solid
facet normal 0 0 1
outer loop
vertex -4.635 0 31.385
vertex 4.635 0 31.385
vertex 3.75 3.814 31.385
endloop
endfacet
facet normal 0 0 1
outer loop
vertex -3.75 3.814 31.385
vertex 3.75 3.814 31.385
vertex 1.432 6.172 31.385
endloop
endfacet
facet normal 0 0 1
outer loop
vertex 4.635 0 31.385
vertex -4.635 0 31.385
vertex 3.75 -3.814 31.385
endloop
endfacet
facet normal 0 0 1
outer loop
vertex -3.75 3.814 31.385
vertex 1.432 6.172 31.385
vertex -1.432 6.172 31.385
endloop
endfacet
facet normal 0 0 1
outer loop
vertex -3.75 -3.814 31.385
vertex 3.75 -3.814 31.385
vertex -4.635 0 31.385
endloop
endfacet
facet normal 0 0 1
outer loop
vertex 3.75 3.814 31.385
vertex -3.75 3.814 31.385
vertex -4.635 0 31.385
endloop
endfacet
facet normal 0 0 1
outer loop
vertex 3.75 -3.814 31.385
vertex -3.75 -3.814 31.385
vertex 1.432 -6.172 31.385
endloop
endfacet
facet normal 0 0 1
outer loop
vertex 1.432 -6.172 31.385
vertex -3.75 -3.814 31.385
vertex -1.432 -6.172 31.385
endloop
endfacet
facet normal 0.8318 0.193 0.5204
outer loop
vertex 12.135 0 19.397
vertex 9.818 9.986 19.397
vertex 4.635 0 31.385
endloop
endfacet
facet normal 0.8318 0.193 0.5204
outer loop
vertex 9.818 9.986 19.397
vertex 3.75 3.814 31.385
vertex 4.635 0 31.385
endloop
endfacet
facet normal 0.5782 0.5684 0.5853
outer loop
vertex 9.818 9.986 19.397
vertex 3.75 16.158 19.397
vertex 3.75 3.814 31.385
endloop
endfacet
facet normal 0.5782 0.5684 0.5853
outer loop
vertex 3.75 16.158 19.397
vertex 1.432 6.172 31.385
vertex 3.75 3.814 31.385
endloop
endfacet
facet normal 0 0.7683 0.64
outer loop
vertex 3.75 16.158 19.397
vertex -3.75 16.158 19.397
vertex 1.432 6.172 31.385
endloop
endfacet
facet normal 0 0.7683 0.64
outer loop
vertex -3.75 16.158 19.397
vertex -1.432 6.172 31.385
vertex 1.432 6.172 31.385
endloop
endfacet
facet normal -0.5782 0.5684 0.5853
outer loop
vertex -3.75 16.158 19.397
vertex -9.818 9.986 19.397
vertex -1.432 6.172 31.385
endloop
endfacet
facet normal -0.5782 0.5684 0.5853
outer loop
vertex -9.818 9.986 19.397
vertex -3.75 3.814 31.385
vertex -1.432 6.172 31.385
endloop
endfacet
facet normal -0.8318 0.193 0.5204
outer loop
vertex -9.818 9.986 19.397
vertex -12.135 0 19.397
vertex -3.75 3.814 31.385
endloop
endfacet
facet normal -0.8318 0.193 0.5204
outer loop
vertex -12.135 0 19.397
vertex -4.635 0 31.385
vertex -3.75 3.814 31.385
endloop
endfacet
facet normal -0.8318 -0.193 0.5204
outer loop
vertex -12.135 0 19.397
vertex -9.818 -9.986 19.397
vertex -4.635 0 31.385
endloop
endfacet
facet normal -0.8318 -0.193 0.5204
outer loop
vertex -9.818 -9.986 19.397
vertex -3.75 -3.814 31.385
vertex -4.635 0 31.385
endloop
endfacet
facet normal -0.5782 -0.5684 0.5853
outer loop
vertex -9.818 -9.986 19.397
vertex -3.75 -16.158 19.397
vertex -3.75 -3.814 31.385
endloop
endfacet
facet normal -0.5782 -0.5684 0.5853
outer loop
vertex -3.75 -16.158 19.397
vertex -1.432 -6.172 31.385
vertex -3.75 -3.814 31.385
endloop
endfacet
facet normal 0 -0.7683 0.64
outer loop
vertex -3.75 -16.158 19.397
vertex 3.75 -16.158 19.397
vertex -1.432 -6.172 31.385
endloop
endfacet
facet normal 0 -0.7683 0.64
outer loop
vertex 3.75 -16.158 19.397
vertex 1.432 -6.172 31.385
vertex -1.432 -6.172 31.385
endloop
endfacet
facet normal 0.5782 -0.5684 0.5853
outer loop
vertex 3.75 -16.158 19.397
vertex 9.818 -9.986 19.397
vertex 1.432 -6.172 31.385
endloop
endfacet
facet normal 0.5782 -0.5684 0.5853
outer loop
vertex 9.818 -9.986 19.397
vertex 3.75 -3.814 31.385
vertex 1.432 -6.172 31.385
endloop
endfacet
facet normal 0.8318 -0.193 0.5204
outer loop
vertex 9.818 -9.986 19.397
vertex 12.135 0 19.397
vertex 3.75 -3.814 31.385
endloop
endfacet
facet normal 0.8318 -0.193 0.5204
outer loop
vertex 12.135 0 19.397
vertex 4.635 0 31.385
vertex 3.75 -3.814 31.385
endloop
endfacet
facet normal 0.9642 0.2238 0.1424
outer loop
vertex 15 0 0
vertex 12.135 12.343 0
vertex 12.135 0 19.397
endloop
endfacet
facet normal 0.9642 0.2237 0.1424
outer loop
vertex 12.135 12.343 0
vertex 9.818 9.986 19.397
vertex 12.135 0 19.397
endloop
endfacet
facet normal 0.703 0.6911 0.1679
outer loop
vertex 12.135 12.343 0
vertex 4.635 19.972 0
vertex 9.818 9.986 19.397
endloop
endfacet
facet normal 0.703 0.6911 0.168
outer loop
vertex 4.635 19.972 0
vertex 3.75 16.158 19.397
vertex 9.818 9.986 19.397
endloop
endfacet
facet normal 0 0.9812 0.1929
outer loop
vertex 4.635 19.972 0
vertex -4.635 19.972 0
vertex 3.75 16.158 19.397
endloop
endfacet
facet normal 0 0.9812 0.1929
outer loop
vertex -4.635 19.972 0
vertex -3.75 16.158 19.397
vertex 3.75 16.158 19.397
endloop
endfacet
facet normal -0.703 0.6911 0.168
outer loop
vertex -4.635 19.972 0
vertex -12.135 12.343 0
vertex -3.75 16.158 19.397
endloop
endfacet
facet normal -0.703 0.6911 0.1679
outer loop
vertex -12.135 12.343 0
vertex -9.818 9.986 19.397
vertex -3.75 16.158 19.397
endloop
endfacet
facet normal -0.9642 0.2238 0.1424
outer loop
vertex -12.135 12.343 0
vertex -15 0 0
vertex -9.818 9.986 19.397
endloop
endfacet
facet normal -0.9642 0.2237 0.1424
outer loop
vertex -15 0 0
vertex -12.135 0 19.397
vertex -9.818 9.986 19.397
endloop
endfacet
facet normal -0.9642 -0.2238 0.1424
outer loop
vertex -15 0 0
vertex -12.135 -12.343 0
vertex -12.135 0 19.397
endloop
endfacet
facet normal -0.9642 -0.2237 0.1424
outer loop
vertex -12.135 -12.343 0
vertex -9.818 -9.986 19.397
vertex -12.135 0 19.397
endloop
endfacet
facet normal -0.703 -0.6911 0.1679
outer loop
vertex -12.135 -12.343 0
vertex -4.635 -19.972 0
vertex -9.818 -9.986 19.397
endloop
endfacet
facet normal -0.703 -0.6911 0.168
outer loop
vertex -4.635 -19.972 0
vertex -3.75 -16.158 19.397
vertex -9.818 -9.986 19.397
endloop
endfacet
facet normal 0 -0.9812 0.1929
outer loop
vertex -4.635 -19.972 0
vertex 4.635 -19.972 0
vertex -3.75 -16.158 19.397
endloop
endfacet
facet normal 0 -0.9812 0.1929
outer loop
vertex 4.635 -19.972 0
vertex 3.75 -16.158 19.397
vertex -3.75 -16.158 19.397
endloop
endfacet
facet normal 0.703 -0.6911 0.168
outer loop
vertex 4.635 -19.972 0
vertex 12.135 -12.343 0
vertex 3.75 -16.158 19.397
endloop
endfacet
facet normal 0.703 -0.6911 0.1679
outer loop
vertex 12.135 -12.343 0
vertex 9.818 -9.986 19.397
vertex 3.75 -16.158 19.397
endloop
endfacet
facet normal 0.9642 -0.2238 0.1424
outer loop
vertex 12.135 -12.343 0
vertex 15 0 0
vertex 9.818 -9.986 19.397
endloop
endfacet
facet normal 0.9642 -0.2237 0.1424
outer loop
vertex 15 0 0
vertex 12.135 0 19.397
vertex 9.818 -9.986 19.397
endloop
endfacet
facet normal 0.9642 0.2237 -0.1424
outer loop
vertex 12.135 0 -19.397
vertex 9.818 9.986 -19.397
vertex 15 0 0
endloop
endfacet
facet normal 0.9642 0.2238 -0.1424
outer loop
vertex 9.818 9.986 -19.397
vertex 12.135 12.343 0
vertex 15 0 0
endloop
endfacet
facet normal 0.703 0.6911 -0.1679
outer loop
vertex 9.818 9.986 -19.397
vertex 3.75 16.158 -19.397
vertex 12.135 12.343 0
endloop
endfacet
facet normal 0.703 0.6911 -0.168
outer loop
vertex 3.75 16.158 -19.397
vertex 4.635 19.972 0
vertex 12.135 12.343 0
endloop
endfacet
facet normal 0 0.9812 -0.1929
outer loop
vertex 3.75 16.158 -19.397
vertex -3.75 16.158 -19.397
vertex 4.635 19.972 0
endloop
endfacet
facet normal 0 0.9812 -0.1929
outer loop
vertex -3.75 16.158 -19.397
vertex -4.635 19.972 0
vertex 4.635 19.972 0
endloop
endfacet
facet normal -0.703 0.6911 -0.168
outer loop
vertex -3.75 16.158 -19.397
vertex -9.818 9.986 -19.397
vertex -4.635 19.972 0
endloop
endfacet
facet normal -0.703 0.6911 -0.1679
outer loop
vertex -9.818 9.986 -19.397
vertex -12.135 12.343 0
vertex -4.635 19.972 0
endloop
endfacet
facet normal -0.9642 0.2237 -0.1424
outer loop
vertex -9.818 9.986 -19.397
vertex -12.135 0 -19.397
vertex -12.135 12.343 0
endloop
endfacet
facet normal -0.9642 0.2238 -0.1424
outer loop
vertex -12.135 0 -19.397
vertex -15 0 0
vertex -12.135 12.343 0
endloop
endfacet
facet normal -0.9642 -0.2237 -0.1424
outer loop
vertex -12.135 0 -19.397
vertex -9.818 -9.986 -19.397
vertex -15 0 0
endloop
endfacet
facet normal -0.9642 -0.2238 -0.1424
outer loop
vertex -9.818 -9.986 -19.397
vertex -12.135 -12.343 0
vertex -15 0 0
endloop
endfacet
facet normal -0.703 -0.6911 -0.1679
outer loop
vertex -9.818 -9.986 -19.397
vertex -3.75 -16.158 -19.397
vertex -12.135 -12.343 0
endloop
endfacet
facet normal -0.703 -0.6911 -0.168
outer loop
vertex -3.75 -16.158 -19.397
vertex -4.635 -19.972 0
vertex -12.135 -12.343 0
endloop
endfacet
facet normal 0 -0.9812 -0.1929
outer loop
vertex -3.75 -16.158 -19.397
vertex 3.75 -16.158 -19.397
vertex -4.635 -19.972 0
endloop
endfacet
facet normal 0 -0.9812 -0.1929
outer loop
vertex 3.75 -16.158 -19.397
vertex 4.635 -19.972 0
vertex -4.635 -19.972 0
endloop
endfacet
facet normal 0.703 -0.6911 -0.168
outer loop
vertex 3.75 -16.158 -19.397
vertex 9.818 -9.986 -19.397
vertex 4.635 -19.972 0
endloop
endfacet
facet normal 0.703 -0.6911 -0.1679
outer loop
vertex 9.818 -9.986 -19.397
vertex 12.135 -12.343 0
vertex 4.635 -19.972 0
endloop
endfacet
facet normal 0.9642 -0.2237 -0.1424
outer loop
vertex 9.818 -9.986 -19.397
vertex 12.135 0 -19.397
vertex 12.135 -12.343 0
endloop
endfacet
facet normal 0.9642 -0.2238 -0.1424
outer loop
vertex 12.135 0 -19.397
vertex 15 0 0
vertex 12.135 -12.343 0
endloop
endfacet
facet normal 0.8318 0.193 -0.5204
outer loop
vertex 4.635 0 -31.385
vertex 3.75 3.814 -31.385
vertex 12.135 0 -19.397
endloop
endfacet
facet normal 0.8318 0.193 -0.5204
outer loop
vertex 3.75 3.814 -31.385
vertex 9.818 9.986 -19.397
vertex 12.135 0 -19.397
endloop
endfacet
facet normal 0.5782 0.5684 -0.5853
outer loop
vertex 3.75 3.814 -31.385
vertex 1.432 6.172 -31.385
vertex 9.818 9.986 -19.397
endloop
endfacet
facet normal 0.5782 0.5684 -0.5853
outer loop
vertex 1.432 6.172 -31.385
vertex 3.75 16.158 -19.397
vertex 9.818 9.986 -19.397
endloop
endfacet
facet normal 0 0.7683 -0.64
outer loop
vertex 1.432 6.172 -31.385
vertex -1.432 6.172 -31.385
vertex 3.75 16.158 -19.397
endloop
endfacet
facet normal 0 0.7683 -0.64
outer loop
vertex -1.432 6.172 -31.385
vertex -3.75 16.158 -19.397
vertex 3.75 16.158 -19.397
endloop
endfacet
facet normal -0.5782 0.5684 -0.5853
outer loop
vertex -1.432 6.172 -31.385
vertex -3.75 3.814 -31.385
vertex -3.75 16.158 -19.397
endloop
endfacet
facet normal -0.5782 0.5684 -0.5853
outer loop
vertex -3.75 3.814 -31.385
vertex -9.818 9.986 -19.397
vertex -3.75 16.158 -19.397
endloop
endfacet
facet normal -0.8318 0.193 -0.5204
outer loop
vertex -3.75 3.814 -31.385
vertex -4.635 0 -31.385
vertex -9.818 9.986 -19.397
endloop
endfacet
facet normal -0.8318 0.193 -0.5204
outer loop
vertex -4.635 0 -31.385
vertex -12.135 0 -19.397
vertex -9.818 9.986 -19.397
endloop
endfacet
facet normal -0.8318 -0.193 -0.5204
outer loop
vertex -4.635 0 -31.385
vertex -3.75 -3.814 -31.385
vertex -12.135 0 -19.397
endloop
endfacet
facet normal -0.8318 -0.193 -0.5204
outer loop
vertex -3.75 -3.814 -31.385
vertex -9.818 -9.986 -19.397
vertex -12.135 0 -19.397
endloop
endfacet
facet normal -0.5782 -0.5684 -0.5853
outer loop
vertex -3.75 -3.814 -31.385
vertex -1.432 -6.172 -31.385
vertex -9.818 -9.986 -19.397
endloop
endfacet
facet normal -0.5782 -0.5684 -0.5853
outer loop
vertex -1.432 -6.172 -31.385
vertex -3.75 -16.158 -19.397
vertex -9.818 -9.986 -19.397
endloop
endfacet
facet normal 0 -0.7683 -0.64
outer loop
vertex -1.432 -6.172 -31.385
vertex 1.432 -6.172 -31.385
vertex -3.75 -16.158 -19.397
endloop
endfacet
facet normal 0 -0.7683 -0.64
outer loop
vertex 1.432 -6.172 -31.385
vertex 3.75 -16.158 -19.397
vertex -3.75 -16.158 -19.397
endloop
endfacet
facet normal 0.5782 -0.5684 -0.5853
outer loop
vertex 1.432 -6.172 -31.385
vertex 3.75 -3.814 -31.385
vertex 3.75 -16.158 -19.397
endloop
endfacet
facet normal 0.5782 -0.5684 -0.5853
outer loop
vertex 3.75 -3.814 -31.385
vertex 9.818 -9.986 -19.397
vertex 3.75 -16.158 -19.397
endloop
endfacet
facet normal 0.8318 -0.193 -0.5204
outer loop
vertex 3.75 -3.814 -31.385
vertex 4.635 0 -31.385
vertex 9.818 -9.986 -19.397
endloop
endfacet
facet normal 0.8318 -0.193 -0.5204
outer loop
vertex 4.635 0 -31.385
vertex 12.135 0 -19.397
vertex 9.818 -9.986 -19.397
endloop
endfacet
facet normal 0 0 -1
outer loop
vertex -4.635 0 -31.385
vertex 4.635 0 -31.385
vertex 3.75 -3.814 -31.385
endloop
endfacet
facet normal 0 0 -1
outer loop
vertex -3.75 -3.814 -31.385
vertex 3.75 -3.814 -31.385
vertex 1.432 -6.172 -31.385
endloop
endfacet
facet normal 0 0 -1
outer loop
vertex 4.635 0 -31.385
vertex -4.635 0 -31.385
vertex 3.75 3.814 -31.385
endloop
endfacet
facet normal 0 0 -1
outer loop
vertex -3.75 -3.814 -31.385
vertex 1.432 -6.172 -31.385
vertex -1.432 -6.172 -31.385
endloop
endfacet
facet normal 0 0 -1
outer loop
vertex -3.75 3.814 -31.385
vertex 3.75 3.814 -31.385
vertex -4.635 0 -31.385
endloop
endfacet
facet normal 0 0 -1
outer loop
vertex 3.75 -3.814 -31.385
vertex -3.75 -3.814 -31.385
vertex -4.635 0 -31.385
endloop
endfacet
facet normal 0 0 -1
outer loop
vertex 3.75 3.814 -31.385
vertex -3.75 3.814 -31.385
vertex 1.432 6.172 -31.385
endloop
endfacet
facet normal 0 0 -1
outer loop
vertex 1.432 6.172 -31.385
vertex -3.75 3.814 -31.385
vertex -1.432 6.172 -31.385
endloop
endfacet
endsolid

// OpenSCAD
// Generated by SolidPython 1.0.1 on 2020-07-29 00:46:46


scale(v = [5, 7, 11]) {
	sphere(r = 3);
}
/***********************************************
*********      SolidPython code:      **********
************************************************
 
# import packages: SolidPython
from solid import *
from solid.utils import *
from itertools import chain, combinations, permutations


class Resize:

    def __init__(self, scad_file):
        self.scad_file = scad_file
        #self.scad_file = import_scad(scad_file)
        # cone/cylinder param:
        self.r1 = 0
        self.r2 = 0
        self.h = 0
        # rectangular prism param:
        self.w = 0
        self.l = 0
        # ellipse param:
        self.r = 0

    # import OpenScad code (file name corresponds to shape)


    # classify shape + parameters
    def assign(self, param1, param2, param3):
        if self.scad_file == 'cone.scad':
            self.r1 = param1
            self.r2 = param2
            self.h = param3
        elif self.scad_file == 'cylinder.scad':
            self.r1 = param1
            self.r2 = param2
            self.h = param3
        elif self.scad_file == 'rectangularPrism.scad':
            self.h = param1
            self.l = param2
            self.w = param3
        else:
            self.r = param1
            self.h = param2

    # resize parameters
    def iterate(self):
        x = range(3, 20, 2)
        i = 1
        if self.scad_file == 'cone.scad':
            tempList = list(permutations(x, 2))
            for temp in tempList:
                param1 = temp[0]
                param2 = temp[1]
                filepath = 'produced_scad_files/' + 'cone' + str(param1) + '_' + str(param2) + '_' + '.scad'
                scad_render_to_file(cylinder(h=param1, r1=param2, r2=0), filepath)

        elif self.scad_file == 'cylinder.scad':
            tempList = list(permutations(x, 3))
            for temp in tempList:
                param1 = temp[0]
                param2 = temp[1]
                filepath = 'produced_scad_files/' + 'cylinder' + str(param1) + '_' + str(param2) + '_' + '.scad'
                scad_render_to_file(cylinder(h=param1, r1=param2, r2=param2), filepath)

        elif self.scad_file == 'rectangularPrism.scad':
            tempList = list(permutations(x, 3))
            for temp in tempList:
                param1 = temp[0]
                param2 = temp[1]
                param3 = temp[2]
                filepath = 'produced_scad_files/' + 'rectangularPrism' + str(param1) + '_' + str(param2) + '_' + str(
                    param3) + '.scad'
                scad_render_to_file(cube(size=(param1, param2, param3)), filepath)

        elif self.scad_file == 'ellipse.scad':
            tempList = list(permutations(x, 4))
            for temp in tempList:
                param1 = temp[0]
                param2 = temp[1]
                param3 = temp[2]
                param4 = temp[3]
                filepath = 'produced_scad_files/' + 'ellipse' + str(param1) + '_' + str(param2) + '_' + str(param3) + '_' + str(param4) + '.scad'
                scad_render_to_file(scale([param1, param2, param3])(sphere(r=param4)), filepath)

    def render_to_scadfile(self):
        scad_render_to_file(scad, 'example.scad') 
 
************************************************/
